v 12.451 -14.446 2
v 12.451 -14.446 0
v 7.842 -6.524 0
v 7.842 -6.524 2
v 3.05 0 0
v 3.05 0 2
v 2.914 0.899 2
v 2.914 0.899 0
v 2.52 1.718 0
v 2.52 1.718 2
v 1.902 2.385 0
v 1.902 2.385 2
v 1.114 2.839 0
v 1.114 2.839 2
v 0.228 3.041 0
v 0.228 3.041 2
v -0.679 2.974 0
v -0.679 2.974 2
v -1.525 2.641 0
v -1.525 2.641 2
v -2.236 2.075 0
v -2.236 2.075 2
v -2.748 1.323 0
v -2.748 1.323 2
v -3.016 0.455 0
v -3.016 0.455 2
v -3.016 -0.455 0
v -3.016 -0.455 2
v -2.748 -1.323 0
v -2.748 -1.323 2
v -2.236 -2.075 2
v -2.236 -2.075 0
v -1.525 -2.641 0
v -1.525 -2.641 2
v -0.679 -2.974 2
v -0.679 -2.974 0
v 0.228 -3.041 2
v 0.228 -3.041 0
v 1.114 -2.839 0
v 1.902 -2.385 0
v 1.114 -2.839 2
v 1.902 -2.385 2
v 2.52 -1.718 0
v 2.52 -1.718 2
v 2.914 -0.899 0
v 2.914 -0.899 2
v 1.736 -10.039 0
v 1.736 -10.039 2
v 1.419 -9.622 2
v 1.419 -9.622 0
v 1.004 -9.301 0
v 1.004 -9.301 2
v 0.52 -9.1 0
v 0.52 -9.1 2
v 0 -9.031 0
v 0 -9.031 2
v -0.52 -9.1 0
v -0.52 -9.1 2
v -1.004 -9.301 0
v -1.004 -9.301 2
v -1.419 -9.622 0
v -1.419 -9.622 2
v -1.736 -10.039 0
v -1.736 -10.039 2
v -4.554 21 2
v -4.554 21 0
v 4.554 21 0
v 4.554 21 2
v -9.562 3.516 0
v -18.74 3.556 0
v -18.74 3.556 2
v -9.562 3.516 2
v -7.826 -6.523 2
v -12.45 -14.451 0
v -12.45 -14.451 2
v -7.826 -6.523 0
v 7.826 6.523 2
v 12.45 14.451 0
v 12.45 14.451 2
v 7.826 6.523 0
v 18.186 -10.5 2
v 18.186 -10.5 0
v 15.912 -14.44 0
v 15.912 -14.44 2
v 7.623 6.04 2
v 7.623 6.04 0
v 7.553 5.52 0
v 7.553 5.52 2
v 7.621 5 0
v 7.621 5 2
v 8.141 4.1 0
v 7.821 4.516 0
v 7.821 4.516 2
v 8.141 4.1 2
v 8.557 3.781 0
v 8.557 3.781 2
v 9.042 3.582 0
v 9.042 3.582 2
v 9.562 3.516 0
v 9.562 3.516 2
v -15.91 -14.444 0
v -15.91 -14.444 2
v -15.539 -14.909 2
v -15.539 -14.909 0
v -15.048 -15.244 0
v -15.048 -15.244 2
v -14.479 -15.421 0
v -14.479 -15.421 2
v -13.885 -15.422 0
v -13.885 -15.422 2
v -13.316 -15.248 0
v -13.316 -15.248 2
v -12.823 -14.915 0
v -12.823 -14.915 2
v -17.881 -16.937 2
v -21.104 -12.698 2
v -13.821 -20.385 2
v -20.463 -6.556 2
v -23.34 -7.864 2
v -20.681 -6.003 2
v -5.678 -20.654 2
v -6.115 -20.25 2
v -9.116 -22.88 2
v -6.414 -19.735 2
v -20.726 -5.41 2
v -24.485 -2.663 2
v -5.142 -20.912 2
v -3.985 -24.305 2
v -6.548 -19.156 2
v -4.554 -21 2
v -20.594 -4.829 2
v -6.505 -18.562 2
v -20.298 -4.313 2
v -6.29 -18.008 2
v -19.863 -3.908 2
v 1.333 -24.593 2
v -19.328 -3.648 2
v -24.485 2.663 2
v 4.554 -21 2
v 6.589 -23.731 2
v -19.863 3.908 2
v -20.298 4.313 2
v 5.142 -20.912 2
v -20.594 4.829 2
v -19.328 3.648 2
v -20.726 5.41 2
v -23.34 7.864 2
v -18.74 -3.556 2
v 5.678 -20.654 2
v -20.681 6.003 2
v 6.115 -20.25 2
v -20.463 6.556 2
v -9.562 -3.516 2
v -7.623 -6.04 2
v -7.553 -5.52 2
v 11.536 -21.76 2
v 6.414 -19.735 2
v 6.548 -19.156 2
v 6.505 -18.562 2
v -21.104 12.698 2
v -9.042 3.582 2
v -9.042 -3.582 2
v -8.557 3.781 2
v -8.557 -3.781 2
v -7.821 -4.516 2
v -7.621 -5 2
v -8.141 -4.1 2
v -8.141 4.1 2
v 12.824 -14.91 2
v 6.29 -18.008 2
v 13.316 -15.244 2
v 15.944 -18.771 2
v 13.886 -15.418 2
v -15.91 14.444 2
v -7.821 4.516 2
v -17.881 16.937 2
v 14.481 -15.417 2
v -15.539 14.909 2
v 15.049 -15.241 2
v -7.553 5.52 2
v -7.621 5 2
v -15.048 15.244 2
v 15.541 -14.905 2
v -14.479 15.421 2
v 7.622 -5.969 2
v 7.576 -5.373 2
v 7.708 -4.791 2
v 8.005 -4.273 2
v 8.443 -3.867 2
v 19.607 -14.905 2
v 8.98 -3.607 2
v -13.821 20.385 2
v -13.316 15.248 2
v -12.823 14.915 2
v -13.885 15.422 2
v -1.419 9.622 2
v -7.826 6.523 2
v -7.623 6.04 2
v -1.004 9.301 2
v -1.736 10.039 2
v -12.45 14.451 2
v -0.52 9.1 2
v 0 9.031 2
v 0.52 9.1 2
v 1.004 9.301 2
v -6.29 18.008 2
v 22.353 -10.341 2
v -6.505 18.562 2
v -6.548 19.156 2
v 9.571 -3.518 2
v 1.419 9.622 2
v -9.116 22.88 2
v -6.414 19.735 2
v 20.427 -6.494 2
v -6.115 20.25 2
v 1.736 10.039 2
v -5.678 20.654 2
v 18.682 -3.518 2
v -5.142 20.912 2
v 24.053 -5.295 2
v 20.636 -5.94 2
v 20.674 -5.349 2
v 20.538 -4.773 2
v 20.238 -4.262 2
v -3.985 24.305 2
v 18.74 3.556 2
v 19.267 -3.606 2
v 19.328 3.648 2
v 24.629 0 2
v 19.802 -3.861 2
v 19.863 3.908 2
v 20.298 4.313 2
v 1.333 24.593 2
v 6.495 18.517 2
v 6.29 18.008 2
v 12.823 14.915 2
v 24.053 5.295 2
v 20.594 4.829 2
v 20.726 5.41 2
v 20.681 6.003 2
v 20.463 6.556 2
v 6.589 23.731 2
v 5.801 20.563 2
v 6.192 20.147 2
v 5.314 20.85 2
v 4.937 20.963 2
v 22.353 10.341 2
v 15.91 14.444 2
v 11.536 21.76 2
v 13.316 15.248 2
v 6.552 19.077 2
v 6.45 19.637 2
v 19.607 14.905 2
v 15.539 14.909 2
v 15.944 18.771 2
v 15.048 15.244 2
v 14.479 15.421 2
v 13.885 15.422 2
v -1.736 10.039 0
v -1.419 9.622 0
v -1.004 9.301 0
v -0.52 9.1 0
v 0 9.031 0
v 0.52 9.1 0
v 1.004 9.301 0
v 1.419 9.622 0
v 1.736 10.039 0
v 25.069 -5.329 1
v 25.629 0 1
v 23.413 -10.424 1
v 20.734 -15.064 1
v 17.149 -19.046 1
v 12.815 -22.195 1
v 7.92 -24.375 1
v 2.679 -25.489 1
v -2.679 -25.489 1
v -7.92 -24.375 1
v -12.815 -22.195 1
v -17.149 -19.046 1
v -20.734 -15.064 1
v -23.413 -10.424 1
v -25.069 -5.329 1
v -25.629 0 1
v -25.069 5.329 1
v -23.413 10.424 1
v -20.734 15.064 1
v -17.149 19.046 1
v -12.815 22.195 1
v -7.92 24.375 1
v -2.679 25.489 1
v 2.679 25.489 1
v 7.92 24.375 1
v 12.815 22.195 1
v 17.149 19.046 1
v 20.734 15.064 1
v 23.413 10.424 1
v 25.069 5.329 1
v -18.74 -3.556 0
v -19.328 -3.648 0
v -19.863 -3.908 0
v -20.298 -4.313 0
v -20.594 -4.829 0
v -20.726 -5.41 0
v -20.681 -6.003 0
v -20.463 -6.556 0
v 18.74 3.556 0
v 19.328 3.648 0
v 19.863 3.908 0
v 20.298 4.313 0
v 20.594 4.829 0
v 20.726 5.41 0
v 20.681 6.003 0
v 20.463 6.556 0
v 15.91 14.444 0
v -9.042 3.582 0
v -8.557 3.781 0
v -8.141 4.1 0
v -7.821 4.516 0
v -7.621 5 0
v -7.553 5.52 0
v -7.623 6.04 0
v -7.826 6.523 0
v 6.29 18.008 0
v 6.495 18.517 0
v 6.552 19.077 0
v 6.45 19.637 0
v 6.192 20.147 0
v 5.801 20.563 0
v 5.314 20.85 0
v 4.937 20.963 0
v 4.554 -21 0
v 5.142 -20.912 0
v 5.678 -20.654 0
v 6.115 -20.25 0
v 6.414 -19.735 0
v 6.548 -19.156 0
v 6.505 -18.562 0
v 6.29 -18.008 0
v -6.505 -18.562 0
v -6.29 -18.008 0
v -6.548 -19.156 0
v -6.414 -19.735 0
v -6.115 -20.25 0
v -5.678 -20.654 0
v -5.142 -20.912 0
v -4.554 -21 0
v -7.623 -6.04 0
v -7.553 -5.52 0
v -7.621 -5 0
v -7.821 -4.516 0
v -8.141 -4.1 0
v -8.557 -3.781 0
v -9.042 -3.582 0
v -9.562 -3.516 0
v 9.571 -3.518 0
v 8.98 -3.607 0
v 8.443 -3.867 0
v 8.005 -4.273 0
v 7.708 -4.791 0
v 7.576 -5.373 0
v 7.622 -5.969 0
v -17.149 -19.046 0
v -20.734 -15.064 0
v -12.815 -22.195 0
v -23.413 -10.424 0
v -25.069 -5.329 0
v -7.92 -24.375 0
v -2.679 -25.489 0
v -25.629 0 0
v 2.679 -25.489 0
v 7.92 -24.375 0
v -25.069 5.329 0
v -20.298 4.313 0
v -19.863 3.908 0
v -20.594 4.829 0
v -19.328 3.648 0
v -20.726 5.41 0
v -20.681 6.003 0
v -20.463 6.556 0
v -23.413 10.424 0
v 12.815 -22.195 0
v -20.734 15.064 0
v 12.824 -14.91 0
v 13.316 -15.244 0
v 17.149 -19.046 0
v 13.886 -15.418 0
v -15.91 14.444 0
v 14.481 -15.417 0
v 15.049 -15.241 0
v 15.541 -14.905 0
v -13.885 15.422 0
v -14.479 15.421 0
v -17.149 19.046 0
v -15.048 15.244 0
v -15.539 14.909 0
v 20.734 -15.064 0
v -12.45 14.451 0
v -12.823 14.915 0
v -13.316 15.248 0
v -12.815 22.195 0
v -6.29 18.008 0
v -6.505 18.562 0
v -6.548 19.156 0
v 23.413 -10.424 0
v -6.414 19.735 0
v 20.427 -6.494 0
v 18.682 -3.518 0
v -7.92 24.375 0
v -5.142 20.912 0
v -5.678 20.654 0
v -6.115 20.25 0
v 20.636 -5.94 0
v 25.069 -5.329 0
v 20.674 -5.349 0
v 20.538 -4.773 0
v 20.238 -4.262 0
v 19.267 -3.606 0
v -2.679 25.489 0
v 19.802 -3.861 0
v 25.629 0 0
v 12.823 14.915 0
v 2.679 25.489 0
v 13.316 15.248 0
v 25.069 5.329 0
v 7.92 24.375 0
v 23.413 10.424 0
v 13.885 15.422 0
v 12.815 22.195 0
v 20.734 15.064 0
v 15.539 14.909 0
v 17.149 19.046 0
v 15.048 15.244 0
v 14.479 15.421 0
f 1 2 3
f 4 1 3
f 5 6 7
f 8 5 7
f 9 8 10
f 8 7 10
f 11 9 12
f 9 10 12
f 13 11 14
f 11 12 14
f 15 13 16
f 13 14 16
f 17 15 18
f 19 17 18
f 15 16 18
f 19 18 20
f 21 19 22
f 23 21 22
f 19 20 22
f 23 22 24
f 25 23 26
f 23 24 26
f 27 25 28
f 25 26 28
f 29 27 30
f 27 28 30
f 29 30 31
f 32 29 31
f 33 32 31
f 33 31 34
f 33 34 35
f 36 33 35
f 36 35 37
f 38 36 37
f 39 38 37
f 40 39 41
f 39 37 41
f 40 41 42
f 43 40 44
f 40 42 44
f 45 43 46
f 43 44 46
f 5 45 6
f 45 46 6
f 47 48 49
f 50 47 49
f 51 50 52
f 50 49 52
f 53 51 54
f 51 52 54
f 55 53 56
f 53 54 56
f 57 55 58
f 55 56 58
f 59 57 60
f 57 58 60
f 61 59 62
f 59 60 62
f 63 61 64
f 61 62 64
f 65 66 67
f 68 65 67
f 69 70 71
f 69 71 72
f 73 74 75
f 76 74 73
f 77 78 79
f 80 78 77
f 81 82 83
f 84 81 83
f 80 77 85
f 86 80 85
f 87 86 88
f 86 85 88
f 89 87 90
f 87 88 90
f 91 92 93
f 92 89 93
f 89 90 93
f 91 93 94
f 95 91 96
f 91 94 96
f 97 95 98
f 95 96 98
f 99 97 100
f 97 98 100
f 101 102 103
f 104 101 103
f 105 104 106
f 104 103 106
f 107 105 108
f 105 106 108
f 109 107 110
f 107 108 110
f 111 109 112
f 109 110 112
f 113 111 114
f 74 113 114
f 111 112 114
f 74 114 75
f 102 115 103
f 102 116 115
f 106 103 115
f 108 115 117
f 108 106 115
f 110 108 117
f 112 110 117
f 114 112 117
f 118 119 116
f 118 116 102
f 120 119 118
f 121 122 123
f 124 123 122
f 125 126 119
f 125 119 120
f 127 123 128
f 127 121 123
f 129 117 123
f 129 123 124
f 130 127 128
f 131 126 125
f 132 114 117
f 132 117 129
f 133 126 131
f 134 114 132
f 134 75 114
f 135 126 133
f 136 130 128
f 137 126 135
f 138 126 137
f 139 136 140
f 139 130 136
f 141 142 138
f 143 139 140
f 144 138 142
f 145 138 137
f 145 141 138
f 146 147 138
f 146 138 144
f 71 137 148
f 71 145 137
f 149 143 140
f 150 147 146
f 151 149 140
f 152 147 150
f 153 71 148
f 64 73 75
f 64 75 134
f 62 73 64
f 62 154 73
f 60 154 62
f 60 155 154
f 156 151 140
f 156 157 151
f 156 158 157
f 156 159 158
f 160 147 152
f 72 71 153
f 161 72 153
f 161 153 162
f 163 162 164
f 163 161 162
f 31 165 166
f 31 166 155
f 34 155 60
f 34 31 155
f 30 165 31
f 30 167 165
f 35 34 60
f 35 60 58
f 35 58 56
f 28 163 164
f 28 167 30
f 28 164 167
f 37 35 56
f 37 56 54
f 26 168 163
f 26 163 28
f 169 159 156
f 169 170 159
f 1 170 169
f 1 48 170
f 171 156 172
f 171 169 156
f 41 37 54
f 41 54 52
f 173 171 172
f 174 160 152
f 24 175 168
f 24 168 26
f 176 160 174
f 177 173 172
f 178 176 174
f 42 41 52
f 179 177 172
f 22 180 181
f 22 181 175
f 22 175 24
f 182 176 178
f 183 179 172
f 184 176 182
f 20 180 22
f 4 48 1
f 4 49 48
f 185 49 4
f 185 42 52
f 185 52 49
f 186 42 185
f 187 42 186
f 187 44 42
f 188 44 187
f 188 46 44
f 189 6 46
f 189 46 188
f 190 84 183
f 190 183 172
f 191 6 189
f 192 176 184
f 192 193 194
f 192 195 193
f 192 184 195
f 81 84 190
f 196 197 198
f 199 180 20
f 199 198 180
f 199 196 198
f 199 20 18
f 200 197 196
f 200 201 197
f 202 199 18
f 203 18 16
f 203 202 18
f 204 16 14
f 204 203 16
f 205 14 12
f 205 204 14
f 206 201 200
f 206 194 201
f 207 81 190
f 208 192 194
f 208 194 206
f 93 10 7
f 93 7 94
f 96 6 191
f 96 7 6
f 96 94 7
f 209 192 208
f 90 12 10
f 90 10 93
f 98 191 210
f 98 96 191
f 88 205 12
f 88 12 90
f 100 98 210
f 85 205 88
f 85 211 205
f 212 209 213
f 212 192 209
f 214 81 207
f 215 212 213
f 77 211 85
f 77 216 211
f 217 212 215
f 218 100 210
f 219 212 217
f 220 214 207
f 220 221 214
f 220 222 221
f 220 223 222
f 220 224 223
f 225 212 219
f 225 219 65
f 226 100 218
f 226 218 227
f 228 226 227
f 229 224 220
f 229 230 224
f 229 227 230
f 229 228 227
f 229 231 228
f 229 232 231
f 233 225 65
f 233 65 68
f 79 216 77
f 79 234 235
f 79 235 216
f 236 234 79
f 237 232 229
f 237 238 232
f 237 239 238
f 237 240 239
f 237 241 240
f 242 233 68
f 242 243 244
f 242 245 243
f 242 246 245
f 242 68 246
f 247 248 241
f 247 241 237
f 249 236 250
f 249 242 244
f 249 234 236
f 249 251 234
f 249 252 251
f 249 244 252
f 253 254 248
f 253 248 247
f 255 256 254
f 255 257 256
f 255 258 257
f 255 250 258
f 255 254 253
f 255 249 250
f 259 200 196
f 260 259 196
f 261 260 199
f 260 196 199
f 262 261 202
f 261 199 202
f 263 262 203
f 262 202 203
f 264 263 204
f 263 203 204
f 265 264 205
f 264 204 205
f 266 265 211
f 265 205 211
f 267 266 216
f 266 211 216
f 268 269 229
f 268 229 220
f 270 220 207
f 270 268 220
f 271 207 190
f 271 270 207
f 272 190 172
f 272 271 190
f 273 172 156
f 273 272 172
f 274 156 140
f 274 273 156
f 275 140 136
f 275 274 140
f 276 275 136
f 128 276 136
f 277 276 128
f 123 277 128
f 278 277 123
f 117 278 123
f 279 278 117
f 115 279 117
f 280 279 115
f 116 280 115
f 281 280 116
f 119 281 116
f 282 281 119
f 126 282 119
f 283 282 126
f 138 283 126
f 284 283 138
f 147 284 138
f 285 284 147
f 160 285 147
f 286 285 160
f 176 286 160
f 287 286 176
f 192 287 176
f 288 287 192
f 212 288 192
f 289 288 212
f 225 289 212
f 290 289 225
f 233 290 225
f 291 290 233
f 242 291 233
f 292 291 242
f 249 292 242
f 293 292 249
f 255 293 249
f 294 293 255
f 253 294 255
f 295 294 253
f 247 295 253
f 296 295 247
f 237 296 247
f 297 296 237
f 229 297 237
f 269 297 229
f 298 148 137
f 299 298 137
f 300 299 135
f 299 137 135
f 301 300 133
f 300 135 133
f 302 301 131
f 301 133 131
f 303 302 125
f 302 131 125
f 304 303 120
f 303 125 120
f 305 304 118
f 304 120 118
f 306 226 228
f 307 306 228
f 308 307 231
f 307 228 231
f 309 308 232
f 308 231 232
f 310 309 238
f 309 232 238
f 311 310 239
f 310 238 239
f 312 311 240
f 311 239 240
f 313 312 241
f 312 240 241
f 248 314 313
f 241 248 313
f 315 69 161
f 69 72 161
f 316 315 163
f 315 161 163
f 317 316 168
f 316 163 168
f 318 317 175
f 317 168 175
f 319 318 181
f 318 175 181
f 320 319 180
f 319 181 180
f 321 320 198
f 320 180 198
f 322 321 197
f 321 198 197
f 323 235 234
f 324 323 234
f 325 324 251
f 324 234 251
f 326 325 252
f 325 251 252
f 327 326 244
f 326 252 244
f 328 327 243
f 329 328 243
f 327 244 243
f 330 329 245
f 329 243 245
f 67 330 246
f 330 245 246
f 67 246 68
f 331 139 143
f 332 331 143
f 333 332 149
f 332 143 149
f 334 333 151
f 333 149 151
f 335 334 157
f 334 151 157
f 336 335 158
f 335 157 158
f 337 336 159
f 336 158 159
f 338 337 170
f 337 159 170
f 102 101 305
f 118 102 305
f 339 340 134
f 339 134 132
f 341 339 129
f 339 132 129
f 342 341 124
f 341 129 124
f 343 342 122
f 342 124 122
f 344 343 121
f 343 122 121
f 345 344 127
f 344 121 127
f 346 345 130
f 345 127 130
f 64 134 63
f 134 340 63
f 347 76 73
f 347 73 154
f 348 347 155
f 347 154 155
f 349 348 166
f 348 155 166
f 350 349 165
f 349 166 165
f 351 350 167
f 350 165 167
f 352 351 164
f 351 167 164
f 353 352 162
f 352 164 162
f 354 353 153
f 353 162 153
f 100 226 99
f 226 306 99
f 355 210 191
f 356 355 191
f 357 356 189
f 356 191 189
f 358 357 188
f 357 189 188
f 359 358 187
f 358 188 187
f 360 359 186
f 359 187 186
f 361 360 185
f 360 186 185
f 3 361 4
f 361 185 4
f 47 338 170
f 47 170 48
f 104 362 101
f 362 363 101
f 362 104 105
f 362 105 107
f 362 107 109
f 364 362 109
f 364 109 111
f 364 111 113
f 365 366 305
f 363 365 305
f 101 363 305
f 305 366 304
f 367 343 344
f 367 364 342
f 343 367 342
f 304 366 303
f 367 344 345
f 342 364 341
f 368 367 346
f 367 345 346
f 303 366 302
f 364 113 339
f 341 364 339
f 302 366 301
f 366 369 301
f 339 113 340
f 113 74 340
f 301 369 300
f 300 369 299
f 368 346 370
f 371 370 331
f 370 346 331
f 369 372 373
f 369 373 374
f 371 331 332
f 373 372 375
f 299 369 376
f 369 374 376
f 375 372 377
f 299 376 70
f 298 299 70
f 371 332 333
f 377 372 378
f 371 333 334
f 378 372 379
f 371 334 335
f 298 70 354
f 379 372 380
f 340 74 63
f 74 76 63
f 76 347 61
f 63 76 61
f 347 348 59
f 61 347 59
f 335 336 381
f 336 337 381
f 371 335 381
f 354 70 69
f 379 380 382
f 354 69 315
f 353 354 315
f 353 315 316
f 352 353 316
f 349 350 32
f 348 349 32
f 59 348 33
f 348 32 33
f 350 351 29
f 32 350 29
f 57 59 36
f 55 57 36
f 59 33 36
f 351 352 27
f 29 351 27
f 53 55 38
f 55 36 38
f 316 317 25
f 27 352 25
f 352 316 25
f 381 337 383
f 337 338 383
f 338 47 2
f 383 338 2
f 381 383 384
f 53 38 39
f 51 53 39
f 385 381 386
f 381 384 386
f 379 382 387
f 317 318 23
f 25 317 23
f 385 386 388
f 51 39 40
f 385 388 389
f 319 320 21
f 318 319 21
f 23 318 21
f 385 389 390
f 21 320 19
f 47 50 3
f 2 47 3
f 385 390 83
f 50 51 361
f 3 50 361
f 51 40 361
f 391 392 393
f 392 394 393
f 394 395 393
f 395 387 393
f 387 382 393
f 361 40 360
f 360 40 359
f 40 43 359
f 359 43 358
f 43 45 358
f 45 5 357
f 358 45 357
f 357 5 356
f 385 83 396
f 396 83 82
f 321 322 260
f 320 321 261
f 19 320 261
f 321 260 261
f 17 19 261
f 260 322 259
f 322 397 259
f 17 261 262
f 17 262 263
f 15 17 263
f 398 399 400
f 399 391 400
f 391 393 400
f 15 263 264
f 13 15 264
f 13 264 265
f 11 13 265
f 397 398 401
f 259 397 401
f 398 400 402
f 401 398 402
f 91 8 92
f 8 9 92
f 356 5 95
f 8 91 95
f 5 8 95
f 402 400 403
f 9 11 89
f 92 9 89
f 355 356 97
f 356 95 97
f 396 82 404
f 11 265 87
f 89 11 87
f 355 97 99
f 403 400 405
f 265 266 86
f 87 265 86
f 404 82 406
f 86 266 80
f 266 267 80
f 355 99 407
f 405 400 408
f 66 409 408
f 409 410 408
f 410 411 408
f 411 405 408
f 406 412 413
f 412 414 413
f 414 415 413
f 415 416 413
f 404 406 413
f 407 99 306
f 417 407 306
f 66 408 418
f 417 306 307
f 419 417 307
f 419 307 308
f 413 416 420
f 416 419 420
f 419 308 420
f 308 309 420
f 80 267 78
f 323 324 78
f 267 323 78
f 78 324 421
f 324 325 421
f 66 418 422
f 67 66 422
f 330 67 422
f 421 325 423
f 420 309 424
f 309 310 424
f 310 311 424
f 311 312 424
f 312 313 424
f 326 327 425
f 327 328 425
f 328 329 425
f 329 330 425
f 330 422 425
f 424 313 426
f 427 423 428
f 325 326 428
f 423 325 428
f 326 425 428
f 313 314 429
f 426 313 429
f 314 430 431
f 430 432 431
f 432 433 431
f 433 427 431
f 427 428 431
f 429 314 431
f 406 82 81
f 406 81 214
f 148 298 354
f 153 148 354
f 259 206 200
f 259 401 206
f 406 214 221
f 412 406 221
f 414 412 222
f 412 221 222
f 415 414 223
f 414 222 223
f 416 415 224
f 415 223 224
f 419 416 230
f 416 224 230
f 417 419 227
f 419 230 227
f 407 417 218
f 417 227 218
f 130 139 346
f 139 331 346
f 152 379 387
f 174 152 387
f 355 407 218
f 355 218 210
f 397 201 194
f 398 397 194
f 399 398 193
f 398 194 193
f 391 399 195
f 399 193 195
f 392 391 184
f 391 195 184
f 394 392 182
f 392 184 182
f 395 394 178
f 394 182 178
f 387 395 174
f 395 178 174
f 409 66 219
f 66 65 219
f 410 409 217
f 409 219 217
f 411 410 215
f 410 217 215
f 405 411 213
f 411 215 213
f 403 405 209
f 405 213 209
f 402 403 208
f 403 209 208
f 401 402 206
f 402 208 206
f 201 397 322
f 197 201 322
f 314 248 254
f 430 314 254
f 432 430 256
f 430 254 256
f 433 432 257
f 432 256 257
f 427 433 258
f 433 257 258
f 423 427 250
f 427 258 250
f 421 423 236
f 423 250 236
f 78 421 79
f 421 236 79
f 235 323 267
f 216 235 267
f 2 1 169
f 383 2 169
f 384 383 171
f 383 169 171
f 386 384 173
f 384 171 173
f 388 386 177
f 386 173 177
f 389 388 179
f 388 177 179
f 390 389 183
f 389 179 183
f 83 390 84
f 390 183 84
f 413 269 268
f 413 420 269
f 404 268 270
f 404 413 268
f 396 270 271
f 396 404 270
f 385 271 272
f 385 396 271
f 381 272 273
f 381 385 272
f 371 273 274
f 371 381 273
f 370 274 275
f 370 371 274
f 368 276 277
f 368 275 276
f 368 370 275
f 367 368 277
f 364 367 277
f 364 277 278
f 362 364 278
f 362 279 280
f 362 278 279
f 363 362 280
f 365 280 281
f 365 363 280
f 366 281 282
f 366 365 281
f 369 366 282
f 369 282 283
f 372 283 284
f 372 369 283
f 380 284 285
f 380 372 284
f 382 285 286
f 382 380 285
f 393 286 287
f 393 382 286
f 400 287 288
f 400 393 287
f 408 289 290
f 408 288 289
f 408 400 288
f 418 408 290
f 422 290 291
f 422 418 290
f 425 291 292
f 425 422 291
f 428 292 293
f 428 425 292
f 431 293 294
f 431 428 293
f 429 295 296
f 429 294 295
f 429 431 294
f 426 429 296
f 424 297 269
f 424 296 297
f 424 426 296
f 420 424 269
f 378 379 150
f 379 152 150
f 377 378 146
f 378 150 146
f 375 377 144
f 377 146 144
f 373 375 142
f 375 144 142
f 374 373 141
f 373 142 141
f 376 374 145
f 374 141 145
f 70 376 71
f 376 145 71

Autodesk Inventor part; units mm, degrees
sketch "Sketch1" plane through (0, 0, 0) normal (0, 0, 1) x (1, 0, 0)
  line L0 (0, 2.8582) -> (0, -2.8582) construction
  line L1 (-5.7775, 0) -> (5.7775, 0) construction
  circle A0 centre (0, 0) radius 25.629
  circle A1 centre (0, 0) radius 4
  line L2 (0, 4) -> (0, 7)
  line L3 (0, 7) -> (0, 21)
  line L4 (0, 21) -> (5, 21)
  line L5 (5, 21) -> (8, 21)
  line L6 (8, 21) -> (0, 7)
  line L7 (0, 21) -> (-8, 21)
  line L8 (-8, 21) -> (0, 7)
  line L9 (0, -4) -> (0, -7)
  line L10 (0, -7) -> (0, -21)
  line L11 (0, -21) -> (8, -21)
  line L12 (8, -21) -> (0, -7)
  line L13 (0, -21) -> (-8, -21)
  line L14 (-8, -21) -> (0, -7)
  line L15 (0, 0) -> (2.5981, 1.5)
  line L16 (0, 0) -> (3, 0) construction
  line L17 (2.5981, 1.5) -> (3.4641, 2)
  line L18 (3.4641, 2) -> (6.0622, 3.5)
  line L19 (6.0622, 3.5) -> (18.1865, 10.5)
  line L20 (18.1865, 10.5) -> (14.1865, 17.4282)
  line L21 (14.1865, 17.4282) -> (6.0622, 3.5)
  line L22 (18.1865, 10.5) -> (22.1865, 3.5718)
  line L23 (22.1865, 3.5718) -> (6.0622, 3.5)
  line L24 (0, 0) -> (8, 0) construction
  line L25 (0, 0) -> (3.4641, -2)
  line L26 (0, 0) -> (4, 0) construction
  line L27 (3.4641, -2) -> (6.0622, -3.5)
  line L28 (6.0622, -3.5) -> (18.1865, -10.5)
  line L29 (18.1865, -10.5) -> (14.1865, -17.4282)
  line L30 (14.1865, -17.4282) -> (6.0934, -3.518)
  line L31 (18.1865, -10.5) -> (22.0919, -3.518)
  line L32 (22.0919, -3.518) -> (6.0934, -3.518)
  line L33 (0, 0) -> (-2.5981, 1.5)
  line L34 (0, 0) -> (3, 0) construction
  line L35 (-2.5981, 1.5) -> (-3.4641, 2)
  line L36 (-3.4641, 2) -> (-6.0622, 3.5)
  line L37 (-6.0622, 3.5) -> (-18.1865, 10.5)
  line L38 (-18.1865, 10.5) -> (-14.1865, 17.4282)
  line L39 (-14.1865, 17.4282) -> (-6.0622, 3.5)
  line L40 (-18.1865, 10.5) -> (-22.1865, 3.5718)
  line L41 (-22.1865, 3.5718) -> (-6.0622, 3.5)
  line L42 (0, 0) -> (-6.0622, -3.5)
  line L43 (0, 0) -> (7, 0) construction
  line L44 (-6.0622, -3.5) -> (-18.1865, -10.5)
  line L45 (-18.1865, -10.5) -> (-14.1865, -17.4282)
  line L46 (-14.1865, -17.4282) -> (-6.0622, -3.5)
  line L47 (-18.1865, -10.5) -> (-22.1865, -3.5718)
  line L48 (-22.1865, -3.5718) -> (-6.0622, -3.5)
  dimension "d0" = 51.258
  dimension "d1" = 8
  dimension "d2" = 3
  dimension "d3" = 14
  dimension "d4" = 5
  dimension "d5" = 3
  dimension "d6" = 8
  dimension "d7" = 3
  dimension "d8" = 14
  dimension "d9" = 8
  dimension "d10" = 8
  dimension "d11" = 3
  dimension "d12" = 30
  dimension "d13" = 3
  dimension "d14" = 14
  dimension "d15" = 8
  dimension "d16" = 8
  dimension "d19" = 4
  dimension "d20" = 30
  dimension "d21" = 3
  dimension "d22" = 14
  dimension "d23" = 8
  dimension "d24" = 8
  dimension "d25" = 3
  dimension "d26" = 150
  dimension "d27" = 1
  dimension "d28" = 180
  dimension "d29" = 3
  dimension "d30" = 180
  dimension "d31" = 180
  dimension "d32" = 8
  dimension "d33" = 8
  dimension "d34" = 7
  dimension "d35" = 150
  dimension "d36" = 14
  dimension "d37" = 180
  dimension "d38" = 8
  dimension "d39" = 8
extrude "Extrusion1" add sketch "Sketch1" along normal blind 2
fillet "Fillet1" radius 2 18 edges at (14.1865, 17.4282, 1) (22.1865, 3.5718, 1) (6.0622, 3.5, 1) (22.0919, -3.518, 1) (14.1865, -17.4282, 1) (6.0934, -3.518, 1) (0, 7, 1) (-8, 21, 1) (8, 21, 1) (-6.0622, 3.5, 1) (-22.1865, 3.5718, 1) (-14.1865, 17.4282, 1) (-6.0622, -3.5, 1) (-14.1865, -17.4282, 1) (-22.1865, -3.5718, 1) (-8, -21, 1) (0, -7, 1) (8, -21, 1)
sketch "Sketch2" plane through (0, 0, 2) normal (0, 0, 1) x (1, 0, 0)
  circle A0 centre (0, 0) radius 3.05
  circle A1 centre (0, 0) radius 5
  dimension "d43" = 6.1
  dimension "d49" = 10
extrude "Extrusion2" add sketch "Sketch2" against normal blind 2
chamfer "Chamfer1" distance 1 angle 45 1 edges at (-25.629, 0, 2)
properties part number "Wiel hout" material "S235"
